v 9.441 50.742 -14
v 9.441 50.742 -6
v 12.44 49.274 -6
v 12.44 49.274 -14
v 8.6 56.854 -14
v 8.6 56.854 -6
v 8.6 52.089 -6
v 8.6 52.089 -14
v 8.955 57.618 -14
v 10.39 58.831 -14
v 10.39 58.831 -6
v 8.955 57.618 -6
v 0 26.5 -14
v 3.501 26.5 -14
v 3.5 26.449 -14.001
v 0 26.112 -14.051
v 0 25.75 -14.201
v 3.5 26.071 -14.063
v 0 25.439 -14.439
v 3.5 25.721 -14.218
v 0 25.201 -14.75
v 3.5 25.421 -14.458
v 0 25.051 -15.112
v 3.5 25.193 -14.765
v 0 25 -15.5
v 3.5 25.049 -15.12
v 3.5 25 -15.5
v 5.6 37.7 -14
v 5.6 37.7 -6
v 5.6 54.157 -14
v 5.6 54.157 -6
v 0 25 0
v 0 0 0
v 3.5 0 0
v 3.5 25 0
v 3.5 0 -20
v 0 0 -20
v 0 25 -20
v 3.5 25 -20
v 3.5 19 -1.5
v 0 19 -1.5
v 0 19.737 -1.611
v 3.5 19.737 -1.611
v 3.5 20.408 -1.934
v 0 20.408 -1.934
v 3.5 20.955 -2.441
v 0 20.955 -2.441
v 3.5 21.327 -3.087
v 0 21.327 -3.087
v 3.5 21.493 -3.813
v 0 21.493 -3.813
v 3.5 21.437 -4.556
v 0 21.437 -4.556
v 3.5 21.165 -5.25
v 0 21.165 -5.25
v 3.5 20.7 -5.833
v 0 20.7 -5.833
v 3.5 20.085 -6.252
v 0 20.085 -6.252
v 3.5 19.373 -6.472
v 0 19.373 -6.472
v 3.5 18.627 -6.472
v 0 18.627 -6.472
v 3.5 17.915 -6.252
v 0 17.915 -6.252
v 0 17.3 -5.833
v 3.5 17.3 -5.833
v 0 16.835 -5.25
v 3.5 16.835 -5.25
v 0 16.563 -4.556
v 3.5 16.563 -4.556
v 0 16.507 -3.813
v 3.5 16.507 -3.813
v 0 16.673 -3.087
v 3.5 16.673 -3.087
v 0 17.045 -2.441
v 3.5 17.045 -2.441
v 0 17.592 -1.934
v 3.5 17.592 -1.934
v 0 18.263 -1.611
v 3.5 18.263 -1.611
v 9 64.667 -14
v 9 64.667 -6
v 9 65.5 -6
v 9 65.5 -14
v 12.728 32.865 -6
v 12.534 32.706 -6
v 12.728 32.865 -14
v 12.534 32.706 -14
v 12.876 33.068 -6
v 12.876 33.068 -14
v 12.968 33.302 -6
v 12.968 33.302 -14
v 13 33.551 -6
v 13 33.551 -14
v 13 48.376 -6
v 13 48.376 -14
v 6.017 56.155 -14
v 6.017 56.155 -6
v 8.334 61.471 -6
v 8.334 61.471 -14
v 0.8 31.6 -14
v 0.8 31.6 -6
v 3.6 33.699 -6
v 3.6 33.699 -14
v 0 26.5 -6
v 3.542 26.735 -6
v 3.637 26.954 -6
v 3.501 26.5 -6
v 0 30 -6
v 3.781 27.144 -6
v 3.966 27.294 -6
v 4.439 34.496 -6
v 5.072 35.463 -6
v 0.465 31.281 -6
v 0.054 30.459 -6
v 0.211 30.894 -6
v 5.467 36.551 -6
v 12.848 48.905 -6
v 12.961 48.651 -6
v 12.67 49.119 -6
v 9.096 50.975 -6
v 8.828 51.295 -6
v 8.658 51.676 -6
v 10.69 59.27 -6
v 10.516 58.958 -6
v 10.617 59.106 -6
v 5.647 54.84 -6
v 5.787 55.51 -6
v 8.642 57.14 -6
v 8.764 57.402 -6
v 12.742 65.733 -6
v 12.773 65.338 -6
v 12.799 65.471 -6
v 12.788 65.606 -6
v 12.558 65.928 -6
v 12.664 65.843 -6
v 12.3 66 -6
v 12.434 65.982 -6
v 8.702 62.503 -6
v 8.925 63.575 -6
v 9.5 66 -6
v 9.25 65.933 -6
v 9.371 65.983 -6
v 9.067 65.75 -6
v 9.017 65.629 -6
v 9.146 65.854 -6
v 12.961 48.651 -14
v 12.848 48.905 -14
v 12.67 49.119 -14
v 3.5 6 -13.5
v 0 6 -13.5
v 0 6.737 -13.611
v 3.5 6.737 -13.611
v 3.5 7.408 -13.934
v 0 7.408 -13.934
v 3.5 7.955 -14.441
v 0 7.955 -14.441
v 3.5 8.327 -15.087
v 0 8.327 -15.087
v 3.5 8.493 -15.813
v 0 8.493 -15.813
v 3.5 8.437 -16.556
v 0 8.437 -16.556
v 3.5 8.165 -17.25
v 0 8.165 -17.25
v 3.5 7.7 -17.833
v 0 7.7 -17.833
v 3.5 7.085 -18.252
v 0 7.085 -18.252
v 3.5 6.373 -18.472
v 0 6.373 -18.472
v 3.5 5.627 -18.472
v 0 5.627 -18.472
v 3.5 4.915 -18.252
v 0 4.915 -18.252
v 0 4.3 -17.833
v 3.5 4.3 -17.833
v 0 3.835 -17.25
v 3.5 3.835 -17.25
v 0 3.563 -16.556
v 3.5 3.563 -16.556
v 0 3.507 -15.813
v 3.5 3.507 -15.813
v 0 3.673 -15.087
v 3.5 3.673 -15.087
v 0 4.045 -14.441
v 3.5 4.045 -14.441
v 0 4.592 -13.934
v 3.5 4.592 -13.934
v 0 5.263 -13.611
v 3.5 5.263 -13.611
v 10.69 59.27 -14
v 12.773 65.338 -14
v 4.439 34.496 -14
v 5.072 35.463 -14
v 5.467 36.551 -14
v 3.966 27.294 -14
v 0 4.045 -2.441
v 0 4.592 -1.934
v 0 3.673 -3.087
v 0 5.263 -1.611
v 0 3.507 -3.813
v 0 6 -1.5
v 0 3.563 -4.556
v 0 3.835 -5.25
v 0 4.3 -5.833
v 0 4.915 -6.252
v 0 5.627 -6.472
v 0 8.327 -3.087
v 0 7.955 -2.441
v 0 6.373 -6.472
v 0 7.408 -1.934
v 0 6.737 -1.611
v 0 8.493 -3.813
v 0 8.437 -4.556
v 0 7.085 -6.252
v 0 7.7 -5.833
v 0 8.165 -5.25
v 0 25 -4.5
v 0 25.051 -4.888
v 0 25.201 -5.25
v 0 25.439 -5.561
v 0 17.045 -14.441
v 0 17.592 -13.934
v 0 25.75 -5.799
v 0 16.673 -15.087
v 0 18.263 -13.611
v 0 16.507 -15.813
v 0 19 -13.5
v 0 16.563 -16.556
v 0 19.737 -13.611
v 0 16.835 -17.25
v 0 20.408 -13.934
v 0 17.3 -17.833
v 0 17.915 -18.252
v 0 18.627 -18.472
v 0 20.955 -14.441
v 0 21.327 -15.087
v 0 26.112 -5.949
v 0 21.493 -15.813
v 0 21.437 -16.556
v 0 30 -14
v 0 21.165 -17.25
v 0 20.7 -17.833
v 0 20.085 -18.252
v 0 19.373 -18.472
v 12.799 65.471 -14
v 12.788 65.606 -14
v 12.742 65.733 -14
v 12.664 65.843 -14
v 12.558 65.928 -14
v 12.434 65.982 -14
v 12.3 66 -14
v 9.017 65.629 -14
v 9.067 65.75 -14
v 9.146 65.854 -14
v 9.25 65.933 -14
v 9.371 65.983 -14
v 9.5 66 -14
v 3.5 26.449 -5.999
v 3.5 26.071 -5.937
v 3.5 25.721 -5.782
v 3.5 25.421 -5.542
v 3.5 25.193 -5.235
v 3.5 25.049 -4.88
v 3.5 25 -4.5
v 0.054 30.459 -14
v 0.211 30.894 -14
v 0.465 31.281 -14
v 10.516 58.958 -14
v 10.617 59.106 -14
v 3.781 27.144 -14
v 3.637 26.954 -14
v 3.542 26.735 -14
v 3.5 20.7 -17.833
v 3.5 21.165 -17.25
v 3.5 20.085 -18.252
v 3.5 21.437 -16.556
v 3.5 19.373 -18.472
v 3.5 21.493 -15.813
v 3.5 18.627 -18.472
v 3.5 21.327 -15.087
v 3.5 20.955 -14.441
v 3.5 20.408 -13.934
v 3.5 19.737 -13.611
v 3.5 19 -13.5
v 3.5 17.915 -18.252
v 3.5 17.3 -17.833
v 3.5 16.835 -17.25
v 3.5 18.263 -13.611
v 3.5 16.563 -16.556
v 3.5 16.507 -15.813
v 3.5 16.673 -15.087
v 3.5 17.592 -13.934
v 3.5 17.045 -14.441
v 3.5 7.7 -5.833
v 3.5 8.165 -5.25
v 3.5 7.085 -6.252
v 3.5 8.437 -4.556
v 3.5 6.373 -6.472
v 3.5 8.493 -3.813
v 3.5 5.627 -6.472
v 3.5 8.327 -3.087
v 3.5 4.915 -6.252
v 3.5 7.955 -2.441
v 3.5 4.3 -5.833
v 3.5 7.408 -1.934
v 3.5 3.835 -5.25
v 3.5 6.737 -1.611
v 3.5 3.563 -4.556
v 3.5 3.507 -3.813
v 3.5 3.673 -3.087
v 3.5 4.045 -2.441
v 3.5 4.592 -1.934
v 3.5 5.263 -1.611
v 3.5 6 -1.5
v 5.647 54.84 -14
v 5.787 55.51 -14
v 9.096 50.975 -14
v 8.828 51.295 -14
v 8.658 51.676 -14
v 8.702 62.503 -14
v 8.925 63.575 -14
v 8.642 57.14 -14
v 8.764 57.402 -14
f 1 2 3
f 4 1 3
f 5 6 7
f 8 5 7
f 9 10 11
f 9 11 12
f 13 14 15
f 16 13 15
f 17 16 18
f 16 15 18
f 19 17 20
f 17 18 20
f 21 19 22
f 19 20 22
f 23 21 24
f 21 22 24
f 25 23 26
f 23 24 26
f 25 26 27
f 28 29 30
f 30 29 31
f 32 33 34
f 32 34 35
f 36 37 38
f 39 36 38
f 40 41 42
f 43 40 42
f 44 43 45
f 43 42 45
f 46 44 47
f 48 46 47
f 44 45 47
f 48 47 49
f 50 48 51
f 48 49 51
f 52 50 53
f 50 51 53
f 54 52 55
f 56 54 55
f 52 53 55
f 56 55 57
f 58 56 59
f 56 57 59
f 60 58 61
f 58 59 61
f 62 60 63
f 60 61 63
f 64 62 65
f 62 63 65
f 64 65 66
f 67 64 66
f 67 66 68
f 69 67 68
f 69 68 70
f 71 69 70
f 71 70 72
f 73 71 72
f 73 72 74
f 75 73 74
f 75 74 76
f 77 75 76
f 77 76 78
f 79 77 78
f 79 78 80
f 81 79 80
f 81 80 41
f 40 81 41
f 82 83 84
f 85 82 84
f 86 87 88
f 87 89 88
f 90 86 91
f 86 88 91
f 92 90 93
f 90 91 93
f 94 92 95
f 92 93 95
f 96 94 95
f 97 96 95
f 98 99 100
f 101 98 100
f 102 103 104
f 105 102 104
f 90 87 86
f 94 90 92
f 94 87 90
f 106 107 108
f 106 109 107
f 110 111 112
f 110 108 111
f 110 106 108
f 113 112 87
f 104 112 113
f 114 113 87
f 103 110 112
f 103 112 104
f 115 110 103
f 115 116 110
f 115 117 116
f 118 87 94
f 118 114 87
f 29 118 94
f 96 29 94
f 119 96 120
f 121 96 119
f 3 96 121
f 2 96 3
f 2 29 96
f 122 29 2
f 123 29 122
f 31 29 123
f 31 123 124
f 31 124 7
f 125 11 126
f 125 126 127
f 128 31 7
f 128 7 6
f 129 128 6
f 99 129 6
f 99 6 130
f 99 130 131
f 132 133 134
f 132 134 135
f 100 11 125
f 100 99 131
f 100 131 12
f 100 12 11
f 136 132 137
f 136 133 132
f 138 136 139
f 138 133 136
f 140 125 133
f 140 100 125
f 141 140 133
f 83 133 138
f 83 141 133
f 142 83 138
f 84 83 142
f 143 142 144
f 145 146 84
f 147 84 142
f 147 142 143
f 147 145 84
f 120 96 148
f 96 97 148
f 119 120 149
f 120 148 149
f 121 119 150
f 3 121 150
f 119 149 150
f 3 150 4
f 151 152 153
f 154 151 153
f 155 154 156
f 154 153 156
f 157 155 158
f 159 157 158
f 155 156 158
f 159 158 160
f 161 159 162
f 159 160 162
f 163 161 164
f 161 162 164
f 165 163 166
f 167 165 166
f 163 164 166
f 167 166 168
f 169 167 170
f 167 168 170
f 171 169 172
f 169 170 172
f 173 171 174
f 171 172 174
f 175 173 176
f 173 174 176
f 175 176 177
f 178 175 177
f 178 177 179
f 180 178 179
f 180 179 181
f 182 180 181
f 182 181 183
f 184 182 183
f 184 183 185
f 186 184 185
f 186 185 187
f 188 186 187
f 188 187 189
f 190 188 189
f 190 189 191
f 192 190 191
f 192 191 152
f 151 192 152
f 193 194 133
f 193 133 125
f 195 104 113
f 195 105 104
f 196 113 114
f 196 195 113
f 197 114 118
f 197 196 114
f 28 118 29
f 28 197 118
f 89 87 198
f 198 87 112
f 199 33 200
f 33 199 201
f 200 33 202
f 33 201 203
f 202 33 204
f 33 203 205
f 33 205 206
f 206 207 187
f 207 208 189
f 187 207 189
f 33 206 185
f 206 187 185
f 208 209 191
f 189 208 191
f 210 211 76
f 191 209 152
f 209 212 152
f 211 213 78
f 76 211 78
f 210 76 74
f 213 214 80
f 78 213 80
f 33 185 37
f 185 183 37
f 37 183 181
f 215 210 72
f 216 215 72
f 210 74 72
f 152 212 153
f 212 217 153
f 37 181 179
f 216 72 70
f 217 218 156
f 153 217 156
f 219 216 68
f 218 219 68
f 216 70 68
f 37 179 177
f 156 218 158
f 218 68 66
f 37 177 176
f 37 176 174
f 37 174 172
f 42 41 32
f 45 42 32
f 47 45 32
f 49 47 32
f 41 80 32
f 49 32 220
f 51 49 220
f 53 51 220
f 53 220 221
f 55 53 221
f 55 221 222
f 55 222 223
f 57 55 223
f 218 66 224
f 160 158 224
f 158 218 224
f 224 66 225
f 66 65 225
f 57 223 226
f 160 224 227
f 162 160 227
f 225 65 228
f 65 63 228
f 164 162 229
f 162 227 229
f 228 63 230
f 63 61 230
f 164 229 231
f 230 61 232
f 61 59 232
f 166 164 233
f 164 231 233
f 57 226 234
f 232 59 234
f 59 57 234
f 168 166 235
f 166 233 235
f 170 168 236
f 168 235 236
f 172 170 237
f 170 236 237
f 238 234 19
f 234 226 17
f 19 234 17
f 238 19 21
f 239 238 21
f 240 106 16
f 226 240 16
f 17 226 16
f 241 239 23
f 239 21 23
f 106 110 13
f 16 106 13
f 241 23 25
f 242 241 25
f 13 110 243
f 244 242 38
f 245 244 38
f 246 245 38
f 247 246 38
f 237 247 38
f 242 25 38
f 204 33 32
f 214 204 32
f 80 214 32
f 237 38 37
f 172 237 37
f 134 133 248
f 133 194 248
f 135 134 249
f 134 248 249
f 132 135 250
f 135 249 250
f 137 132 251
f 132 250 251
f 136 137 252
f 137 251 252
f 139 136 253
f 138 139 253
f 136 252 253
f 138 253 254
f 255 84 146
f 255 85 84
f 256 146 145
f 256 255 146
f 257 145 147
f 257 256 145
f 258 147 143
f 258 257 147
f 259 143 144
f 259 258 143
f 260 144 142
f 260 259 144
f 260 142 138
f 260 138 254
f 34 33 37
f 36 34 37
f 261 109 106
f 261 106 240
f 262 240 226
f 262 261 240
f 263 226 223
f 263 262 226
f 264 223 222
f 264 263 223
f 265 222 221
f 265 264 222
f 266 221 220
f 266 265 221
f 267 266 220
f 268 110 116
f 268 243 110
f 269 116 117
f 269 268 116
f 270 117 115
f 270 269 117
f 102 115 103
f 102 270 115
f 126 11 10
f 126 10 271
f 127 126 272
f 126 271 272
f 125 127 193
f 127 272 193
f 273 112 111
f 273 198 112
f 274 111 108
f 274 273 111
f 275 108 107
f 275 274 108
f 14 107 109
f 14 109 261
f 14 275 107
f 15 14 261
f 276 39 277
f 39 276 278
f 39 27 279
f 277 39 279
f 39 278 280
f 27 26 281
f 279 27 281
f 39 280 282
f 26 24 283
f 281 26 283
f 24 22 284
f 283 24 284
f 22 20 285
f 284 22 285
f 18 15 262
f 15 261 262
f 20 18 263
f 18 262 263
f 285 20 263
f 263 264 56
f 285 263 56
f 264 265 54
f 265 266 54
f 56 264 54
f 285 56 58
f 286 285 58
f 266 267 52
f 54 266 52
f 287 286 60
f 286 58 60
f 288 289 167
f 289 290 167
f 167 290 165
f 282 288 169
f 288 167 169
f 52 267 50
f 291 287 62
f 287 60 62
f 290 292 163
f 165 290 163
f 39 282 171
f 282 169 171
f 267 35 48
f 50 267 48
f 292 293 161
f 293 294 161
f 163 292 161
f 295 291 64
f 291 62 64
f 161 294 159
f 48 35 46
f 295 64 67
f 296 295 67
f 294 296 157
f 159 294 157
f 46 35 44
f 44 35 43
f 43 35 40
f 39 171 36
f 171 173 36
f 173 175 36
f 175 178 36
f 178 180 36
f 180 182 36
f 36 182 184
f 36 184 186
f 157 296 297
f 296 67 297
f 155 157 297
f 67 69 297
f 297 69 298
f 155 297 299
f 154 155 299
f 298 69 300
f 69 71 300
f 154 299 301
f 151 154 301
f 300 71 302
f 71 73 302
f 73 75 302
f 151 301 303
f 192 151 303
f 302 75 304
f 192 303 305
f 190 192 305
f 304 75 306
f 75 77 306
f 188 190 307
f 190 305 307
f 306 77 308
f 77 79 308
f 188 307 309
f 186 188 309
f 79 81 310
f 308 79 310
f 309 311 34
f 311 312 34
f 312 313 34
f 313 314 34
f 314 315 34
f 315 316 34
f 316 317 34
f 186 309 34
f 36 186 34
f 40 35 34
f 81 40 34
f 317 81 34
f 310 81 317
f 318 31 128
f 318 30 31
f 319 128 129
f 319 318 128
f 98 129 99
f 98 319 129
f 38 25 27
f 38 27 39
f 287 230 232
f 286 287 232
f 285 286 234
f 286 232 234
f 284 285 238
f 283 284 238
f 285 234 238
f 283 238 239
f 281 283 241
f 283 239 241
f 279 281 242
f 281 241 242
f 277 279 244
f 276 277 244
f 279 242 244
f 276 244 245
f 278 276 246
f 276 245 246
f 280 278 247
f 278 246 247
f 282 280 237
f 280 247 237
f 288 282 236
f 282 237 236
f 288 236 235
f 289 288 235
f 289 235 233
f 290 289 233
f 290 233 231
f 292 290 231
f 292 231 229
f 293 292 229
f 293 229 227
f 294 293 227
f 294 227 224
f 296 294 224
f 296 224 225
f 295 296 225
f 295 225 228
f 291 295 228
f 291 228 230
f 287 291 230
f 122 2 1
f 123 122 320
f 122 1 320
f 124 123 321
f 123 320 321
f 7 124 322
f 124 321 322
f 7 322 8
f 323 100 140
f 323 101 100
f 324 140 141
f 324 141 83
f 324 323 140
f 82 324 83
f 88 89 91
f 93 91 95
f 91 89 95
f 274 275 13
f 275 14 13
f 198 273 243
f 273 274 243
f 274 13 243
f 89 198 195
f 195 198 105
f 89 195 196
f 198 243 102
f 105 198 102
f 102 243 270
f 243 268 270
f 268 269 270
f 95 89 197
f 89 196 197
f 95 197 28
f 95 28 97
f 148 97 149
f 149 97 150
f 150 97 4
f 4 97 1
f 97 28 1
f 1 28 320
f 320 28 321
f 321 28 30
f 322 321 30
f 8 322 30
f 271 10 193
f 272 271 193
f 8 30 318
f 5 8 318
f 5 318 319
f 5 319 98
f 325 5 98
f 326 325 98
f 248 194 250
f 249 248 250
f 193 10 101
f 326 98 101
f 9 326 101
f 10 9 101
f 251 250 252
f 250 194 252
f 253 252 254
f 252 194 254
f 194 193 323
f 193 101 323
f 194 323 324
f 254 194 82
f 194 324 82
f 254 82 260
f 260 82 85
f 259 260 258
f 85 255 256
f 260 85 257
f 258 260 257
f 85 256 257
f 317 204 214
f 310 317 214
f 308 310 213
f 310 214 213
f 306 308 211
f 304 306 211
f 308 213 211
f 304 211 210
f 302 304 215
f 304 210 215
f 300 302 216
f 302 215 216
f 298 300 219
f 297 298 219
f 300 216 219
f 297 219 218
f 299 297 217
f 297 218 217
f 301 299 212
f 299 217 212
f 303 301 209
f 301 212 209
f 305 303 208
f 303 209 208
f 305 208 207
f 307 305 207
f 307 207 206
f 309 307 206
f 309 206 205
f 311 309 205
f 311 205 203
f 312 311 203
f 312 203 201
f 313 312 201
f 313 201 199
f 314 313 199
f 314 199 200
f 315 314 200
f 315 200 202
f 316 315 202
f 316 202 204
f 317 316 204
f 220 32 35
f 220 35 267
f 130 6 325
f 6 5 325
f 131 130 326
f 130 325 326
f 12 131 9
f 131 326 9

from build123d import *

# Parameters (mm, degrees)
SKETCH1_W                = 20
SKETCH1_H                = 25
BOSS_EXTRUDE2_DEPTH      = 3.5
BOSS_EXTRUDE3_DEPTH      = 9.5
BOSS_EXTRUDE3_DEPTH_BACK = 3.5
SKETCH2_W                = 8
SKETCH2_H                = 41
SKETCH3_R                = 2.5
CUT_EXTRUDE1_DEPTH       = 9.5
CUT_EXTRUDE2_DEPTH       = 9.5
FILLET1_R                = 1.5
FILLET2_R                = 1.5
FILLET3_R                = 2
FILLET4_R                = 5
FILLET5_R                = 5
FILLET6_R                = 8
FILLET7_R                = 0.5
FILLET8_R                = 1
FILLET9_R                = 1
FILLET10_R               = 1
FILLET11_R               = 1.5
FILLET12_R               = 1
FILLET13_R               = 1
FILLET14_R               = 0.5


with BuildPart() as part:
    # Sketch1 → Boss-Extrude2 (new body)
    with BuildSketch(Plane(origin=(0, 0, 0), x_dir=(0, 0, -1), z_dir=(1, 0, 0))):
        with Locations((10, 12.5)):
            Rectangle(SKETCH1_W, SKETCH1_H)
    extrude(amount=BOSS_EXTRUDE2_DEPTH)

    # Sketch2 → Boss-Extrude3 (add, two sides: drawn at the far end of the back side and taken through both)
    with BuildSketch(Plane(origin=(3.5, 0, 0), x_dir=(0, 0, -1), z_dir=(1, 0, 0)).offset(-BOSS_EXTRUDE3_DEPTH_BACK)):
        with Locations((10, 45.5)):
            Rectangle(SKETCH2_W, SKETCH2_H)
    extrude(amount=BOSS_EXTRUDE3_DEPTH + BOSS_EXTRUDE3_DEPTH_BACK)

    # Sketch3 → Cut-Extrude1 (cut)
    with BuildSketch(Plane.ZY):
        with Locations((-16, 19)):
            Circle(SKETCH3_R)
        with Locations((-16, 6)):
            Circle(SKETCH3_R)
        with Locations((-4, 6)):
            Circle(SKETCH3_R)
        with Locations((-4, 19)):
            Circle(SKETCH3_R)
    extrude(amount=-CUT_EXTRUDE1_DEPTH, mode=Mode.SUBTRACT)

    # Sketch4 → Cut-Extrude2 (cut)
    with BuildSketch(Plane.XY.offset(-6)):
        Polygon((0, 66), (0, 31), (5.600462456, 35.199383322), (5.600462456, 55.199383322), (9, 63), (9, 66), align=None)
        Polygon((3.5, 27), (3.5, 25), (13, 25), (13, 33), align=None)
        Polygon((13, 49), (13, 66), (10.600462456, 59.00909695), (8.600462456, 57.318186777), (8.600462456, 51.153091521), align=None)
    extrude(amount=-CUT_EXTRUDE2_DEPTH, mode=Mode.SUBTRACT)

    # Fillet1
    fillet1_edges = [part.edges().sort_by_distance(p)[0] for p in [
        (1.75, 25, -6),
    ]]
    fillet(fillet1_edges, radius=FILLET1_R)

    # Fillet2
    fillet2_edges = [part.edges().sort_by_distance(p)[0] for p in [
        (1.75, 25, -14),
    ]]
    fillet(fillet2_edges, radius=FILLET2_R)

    # Fillet3
    fillet3_edges = [part.edges().sort_by_distance(p)[0] for p in [
        (0, 31, -10),
    ]]
    fillet(fillet3_edges, radius=FILLET3_R)

    # Fillet4
    fillet4_edges = [part.edges().sort_by_distance(p)[0] for p in [
        (5.600462456, 35.199383322, -10),
    ]]
    fillet(fillet4_edges, radius=FILLET4_R)

    # Fillet5
    fillet5_edges = [part.edges().sort_by_distance(p)[0] for p in [
        (5.600462456, 55.199383322, -10),
    ]]
    fillet(fillet5_edges, radius=FILLET5_R)

    # Fillet6
    fillet6_edges = [part.edges().sort_by_distance(p)[0] for p in [
        (9, 63, -10),
    ]]
    fillet(fillet6_edges, radius=FILLET6_R)

    # Fillet7
    fillet7_edges = [part.edges().sort_by_distance(p)[0] for p in [
        (9, 66, -10),
    ]]
    fillet(fillet7_edges, radius=FILLET7_R)

    # Fillet8
    fillet8_edges = [part.edges().sort_by_distance(p)[0] for p in [
        (3.5, 27, -10),
    ]]
    fillet(fillet8_edges, radius=FILLET8_R)

    # Fillet9
    fillet9_edges = [part.edges().sort_by_distance(p)[0] for p in [
        (13, 33, -10),
    ]]
    fillet(fillet9_edges, radius=FILLET9_R)

    # Fillet10
    fillet10_edges = [part.edges().sort_by_distance(p)[0] for p in [
        (13, 49, -10),
    ]]
    fillet(fillet10_edges, radius=FILLET10_R)

    # Fillet11
    fillet11_edges = [part.edges().sort_by_distance(p)[0] for p in [
        (8.600462456, 51.153091521, -10),
    ]]
    fillet(fillet11_edges, radius=FILLET11_R)

    # Fillet12
    fillet12_edges = [part.edges().sort_by_distance(p)[0] for p in [
        (8.600462456, 57.318186777, -10),
    ]]
    fillet(fillet12_edges, radius=FILLET12_R)

    # Fillet13
    fillet13_edges = [part.edges().sort_by_distance(p)[0] for p in [
        (10.600462456, 59.00909695, -10),
    ]]
    fillet(fillet13_edges, radius=FILLET13_R)

    # Fillet14
    fillet14_edges = [part.edges().sort_by_distance(p)[0] for p in [
        (13, 66, -10),
    ]]
    fillet(fillet14_edges, radius=FILLET14_R)


solid = part.part
